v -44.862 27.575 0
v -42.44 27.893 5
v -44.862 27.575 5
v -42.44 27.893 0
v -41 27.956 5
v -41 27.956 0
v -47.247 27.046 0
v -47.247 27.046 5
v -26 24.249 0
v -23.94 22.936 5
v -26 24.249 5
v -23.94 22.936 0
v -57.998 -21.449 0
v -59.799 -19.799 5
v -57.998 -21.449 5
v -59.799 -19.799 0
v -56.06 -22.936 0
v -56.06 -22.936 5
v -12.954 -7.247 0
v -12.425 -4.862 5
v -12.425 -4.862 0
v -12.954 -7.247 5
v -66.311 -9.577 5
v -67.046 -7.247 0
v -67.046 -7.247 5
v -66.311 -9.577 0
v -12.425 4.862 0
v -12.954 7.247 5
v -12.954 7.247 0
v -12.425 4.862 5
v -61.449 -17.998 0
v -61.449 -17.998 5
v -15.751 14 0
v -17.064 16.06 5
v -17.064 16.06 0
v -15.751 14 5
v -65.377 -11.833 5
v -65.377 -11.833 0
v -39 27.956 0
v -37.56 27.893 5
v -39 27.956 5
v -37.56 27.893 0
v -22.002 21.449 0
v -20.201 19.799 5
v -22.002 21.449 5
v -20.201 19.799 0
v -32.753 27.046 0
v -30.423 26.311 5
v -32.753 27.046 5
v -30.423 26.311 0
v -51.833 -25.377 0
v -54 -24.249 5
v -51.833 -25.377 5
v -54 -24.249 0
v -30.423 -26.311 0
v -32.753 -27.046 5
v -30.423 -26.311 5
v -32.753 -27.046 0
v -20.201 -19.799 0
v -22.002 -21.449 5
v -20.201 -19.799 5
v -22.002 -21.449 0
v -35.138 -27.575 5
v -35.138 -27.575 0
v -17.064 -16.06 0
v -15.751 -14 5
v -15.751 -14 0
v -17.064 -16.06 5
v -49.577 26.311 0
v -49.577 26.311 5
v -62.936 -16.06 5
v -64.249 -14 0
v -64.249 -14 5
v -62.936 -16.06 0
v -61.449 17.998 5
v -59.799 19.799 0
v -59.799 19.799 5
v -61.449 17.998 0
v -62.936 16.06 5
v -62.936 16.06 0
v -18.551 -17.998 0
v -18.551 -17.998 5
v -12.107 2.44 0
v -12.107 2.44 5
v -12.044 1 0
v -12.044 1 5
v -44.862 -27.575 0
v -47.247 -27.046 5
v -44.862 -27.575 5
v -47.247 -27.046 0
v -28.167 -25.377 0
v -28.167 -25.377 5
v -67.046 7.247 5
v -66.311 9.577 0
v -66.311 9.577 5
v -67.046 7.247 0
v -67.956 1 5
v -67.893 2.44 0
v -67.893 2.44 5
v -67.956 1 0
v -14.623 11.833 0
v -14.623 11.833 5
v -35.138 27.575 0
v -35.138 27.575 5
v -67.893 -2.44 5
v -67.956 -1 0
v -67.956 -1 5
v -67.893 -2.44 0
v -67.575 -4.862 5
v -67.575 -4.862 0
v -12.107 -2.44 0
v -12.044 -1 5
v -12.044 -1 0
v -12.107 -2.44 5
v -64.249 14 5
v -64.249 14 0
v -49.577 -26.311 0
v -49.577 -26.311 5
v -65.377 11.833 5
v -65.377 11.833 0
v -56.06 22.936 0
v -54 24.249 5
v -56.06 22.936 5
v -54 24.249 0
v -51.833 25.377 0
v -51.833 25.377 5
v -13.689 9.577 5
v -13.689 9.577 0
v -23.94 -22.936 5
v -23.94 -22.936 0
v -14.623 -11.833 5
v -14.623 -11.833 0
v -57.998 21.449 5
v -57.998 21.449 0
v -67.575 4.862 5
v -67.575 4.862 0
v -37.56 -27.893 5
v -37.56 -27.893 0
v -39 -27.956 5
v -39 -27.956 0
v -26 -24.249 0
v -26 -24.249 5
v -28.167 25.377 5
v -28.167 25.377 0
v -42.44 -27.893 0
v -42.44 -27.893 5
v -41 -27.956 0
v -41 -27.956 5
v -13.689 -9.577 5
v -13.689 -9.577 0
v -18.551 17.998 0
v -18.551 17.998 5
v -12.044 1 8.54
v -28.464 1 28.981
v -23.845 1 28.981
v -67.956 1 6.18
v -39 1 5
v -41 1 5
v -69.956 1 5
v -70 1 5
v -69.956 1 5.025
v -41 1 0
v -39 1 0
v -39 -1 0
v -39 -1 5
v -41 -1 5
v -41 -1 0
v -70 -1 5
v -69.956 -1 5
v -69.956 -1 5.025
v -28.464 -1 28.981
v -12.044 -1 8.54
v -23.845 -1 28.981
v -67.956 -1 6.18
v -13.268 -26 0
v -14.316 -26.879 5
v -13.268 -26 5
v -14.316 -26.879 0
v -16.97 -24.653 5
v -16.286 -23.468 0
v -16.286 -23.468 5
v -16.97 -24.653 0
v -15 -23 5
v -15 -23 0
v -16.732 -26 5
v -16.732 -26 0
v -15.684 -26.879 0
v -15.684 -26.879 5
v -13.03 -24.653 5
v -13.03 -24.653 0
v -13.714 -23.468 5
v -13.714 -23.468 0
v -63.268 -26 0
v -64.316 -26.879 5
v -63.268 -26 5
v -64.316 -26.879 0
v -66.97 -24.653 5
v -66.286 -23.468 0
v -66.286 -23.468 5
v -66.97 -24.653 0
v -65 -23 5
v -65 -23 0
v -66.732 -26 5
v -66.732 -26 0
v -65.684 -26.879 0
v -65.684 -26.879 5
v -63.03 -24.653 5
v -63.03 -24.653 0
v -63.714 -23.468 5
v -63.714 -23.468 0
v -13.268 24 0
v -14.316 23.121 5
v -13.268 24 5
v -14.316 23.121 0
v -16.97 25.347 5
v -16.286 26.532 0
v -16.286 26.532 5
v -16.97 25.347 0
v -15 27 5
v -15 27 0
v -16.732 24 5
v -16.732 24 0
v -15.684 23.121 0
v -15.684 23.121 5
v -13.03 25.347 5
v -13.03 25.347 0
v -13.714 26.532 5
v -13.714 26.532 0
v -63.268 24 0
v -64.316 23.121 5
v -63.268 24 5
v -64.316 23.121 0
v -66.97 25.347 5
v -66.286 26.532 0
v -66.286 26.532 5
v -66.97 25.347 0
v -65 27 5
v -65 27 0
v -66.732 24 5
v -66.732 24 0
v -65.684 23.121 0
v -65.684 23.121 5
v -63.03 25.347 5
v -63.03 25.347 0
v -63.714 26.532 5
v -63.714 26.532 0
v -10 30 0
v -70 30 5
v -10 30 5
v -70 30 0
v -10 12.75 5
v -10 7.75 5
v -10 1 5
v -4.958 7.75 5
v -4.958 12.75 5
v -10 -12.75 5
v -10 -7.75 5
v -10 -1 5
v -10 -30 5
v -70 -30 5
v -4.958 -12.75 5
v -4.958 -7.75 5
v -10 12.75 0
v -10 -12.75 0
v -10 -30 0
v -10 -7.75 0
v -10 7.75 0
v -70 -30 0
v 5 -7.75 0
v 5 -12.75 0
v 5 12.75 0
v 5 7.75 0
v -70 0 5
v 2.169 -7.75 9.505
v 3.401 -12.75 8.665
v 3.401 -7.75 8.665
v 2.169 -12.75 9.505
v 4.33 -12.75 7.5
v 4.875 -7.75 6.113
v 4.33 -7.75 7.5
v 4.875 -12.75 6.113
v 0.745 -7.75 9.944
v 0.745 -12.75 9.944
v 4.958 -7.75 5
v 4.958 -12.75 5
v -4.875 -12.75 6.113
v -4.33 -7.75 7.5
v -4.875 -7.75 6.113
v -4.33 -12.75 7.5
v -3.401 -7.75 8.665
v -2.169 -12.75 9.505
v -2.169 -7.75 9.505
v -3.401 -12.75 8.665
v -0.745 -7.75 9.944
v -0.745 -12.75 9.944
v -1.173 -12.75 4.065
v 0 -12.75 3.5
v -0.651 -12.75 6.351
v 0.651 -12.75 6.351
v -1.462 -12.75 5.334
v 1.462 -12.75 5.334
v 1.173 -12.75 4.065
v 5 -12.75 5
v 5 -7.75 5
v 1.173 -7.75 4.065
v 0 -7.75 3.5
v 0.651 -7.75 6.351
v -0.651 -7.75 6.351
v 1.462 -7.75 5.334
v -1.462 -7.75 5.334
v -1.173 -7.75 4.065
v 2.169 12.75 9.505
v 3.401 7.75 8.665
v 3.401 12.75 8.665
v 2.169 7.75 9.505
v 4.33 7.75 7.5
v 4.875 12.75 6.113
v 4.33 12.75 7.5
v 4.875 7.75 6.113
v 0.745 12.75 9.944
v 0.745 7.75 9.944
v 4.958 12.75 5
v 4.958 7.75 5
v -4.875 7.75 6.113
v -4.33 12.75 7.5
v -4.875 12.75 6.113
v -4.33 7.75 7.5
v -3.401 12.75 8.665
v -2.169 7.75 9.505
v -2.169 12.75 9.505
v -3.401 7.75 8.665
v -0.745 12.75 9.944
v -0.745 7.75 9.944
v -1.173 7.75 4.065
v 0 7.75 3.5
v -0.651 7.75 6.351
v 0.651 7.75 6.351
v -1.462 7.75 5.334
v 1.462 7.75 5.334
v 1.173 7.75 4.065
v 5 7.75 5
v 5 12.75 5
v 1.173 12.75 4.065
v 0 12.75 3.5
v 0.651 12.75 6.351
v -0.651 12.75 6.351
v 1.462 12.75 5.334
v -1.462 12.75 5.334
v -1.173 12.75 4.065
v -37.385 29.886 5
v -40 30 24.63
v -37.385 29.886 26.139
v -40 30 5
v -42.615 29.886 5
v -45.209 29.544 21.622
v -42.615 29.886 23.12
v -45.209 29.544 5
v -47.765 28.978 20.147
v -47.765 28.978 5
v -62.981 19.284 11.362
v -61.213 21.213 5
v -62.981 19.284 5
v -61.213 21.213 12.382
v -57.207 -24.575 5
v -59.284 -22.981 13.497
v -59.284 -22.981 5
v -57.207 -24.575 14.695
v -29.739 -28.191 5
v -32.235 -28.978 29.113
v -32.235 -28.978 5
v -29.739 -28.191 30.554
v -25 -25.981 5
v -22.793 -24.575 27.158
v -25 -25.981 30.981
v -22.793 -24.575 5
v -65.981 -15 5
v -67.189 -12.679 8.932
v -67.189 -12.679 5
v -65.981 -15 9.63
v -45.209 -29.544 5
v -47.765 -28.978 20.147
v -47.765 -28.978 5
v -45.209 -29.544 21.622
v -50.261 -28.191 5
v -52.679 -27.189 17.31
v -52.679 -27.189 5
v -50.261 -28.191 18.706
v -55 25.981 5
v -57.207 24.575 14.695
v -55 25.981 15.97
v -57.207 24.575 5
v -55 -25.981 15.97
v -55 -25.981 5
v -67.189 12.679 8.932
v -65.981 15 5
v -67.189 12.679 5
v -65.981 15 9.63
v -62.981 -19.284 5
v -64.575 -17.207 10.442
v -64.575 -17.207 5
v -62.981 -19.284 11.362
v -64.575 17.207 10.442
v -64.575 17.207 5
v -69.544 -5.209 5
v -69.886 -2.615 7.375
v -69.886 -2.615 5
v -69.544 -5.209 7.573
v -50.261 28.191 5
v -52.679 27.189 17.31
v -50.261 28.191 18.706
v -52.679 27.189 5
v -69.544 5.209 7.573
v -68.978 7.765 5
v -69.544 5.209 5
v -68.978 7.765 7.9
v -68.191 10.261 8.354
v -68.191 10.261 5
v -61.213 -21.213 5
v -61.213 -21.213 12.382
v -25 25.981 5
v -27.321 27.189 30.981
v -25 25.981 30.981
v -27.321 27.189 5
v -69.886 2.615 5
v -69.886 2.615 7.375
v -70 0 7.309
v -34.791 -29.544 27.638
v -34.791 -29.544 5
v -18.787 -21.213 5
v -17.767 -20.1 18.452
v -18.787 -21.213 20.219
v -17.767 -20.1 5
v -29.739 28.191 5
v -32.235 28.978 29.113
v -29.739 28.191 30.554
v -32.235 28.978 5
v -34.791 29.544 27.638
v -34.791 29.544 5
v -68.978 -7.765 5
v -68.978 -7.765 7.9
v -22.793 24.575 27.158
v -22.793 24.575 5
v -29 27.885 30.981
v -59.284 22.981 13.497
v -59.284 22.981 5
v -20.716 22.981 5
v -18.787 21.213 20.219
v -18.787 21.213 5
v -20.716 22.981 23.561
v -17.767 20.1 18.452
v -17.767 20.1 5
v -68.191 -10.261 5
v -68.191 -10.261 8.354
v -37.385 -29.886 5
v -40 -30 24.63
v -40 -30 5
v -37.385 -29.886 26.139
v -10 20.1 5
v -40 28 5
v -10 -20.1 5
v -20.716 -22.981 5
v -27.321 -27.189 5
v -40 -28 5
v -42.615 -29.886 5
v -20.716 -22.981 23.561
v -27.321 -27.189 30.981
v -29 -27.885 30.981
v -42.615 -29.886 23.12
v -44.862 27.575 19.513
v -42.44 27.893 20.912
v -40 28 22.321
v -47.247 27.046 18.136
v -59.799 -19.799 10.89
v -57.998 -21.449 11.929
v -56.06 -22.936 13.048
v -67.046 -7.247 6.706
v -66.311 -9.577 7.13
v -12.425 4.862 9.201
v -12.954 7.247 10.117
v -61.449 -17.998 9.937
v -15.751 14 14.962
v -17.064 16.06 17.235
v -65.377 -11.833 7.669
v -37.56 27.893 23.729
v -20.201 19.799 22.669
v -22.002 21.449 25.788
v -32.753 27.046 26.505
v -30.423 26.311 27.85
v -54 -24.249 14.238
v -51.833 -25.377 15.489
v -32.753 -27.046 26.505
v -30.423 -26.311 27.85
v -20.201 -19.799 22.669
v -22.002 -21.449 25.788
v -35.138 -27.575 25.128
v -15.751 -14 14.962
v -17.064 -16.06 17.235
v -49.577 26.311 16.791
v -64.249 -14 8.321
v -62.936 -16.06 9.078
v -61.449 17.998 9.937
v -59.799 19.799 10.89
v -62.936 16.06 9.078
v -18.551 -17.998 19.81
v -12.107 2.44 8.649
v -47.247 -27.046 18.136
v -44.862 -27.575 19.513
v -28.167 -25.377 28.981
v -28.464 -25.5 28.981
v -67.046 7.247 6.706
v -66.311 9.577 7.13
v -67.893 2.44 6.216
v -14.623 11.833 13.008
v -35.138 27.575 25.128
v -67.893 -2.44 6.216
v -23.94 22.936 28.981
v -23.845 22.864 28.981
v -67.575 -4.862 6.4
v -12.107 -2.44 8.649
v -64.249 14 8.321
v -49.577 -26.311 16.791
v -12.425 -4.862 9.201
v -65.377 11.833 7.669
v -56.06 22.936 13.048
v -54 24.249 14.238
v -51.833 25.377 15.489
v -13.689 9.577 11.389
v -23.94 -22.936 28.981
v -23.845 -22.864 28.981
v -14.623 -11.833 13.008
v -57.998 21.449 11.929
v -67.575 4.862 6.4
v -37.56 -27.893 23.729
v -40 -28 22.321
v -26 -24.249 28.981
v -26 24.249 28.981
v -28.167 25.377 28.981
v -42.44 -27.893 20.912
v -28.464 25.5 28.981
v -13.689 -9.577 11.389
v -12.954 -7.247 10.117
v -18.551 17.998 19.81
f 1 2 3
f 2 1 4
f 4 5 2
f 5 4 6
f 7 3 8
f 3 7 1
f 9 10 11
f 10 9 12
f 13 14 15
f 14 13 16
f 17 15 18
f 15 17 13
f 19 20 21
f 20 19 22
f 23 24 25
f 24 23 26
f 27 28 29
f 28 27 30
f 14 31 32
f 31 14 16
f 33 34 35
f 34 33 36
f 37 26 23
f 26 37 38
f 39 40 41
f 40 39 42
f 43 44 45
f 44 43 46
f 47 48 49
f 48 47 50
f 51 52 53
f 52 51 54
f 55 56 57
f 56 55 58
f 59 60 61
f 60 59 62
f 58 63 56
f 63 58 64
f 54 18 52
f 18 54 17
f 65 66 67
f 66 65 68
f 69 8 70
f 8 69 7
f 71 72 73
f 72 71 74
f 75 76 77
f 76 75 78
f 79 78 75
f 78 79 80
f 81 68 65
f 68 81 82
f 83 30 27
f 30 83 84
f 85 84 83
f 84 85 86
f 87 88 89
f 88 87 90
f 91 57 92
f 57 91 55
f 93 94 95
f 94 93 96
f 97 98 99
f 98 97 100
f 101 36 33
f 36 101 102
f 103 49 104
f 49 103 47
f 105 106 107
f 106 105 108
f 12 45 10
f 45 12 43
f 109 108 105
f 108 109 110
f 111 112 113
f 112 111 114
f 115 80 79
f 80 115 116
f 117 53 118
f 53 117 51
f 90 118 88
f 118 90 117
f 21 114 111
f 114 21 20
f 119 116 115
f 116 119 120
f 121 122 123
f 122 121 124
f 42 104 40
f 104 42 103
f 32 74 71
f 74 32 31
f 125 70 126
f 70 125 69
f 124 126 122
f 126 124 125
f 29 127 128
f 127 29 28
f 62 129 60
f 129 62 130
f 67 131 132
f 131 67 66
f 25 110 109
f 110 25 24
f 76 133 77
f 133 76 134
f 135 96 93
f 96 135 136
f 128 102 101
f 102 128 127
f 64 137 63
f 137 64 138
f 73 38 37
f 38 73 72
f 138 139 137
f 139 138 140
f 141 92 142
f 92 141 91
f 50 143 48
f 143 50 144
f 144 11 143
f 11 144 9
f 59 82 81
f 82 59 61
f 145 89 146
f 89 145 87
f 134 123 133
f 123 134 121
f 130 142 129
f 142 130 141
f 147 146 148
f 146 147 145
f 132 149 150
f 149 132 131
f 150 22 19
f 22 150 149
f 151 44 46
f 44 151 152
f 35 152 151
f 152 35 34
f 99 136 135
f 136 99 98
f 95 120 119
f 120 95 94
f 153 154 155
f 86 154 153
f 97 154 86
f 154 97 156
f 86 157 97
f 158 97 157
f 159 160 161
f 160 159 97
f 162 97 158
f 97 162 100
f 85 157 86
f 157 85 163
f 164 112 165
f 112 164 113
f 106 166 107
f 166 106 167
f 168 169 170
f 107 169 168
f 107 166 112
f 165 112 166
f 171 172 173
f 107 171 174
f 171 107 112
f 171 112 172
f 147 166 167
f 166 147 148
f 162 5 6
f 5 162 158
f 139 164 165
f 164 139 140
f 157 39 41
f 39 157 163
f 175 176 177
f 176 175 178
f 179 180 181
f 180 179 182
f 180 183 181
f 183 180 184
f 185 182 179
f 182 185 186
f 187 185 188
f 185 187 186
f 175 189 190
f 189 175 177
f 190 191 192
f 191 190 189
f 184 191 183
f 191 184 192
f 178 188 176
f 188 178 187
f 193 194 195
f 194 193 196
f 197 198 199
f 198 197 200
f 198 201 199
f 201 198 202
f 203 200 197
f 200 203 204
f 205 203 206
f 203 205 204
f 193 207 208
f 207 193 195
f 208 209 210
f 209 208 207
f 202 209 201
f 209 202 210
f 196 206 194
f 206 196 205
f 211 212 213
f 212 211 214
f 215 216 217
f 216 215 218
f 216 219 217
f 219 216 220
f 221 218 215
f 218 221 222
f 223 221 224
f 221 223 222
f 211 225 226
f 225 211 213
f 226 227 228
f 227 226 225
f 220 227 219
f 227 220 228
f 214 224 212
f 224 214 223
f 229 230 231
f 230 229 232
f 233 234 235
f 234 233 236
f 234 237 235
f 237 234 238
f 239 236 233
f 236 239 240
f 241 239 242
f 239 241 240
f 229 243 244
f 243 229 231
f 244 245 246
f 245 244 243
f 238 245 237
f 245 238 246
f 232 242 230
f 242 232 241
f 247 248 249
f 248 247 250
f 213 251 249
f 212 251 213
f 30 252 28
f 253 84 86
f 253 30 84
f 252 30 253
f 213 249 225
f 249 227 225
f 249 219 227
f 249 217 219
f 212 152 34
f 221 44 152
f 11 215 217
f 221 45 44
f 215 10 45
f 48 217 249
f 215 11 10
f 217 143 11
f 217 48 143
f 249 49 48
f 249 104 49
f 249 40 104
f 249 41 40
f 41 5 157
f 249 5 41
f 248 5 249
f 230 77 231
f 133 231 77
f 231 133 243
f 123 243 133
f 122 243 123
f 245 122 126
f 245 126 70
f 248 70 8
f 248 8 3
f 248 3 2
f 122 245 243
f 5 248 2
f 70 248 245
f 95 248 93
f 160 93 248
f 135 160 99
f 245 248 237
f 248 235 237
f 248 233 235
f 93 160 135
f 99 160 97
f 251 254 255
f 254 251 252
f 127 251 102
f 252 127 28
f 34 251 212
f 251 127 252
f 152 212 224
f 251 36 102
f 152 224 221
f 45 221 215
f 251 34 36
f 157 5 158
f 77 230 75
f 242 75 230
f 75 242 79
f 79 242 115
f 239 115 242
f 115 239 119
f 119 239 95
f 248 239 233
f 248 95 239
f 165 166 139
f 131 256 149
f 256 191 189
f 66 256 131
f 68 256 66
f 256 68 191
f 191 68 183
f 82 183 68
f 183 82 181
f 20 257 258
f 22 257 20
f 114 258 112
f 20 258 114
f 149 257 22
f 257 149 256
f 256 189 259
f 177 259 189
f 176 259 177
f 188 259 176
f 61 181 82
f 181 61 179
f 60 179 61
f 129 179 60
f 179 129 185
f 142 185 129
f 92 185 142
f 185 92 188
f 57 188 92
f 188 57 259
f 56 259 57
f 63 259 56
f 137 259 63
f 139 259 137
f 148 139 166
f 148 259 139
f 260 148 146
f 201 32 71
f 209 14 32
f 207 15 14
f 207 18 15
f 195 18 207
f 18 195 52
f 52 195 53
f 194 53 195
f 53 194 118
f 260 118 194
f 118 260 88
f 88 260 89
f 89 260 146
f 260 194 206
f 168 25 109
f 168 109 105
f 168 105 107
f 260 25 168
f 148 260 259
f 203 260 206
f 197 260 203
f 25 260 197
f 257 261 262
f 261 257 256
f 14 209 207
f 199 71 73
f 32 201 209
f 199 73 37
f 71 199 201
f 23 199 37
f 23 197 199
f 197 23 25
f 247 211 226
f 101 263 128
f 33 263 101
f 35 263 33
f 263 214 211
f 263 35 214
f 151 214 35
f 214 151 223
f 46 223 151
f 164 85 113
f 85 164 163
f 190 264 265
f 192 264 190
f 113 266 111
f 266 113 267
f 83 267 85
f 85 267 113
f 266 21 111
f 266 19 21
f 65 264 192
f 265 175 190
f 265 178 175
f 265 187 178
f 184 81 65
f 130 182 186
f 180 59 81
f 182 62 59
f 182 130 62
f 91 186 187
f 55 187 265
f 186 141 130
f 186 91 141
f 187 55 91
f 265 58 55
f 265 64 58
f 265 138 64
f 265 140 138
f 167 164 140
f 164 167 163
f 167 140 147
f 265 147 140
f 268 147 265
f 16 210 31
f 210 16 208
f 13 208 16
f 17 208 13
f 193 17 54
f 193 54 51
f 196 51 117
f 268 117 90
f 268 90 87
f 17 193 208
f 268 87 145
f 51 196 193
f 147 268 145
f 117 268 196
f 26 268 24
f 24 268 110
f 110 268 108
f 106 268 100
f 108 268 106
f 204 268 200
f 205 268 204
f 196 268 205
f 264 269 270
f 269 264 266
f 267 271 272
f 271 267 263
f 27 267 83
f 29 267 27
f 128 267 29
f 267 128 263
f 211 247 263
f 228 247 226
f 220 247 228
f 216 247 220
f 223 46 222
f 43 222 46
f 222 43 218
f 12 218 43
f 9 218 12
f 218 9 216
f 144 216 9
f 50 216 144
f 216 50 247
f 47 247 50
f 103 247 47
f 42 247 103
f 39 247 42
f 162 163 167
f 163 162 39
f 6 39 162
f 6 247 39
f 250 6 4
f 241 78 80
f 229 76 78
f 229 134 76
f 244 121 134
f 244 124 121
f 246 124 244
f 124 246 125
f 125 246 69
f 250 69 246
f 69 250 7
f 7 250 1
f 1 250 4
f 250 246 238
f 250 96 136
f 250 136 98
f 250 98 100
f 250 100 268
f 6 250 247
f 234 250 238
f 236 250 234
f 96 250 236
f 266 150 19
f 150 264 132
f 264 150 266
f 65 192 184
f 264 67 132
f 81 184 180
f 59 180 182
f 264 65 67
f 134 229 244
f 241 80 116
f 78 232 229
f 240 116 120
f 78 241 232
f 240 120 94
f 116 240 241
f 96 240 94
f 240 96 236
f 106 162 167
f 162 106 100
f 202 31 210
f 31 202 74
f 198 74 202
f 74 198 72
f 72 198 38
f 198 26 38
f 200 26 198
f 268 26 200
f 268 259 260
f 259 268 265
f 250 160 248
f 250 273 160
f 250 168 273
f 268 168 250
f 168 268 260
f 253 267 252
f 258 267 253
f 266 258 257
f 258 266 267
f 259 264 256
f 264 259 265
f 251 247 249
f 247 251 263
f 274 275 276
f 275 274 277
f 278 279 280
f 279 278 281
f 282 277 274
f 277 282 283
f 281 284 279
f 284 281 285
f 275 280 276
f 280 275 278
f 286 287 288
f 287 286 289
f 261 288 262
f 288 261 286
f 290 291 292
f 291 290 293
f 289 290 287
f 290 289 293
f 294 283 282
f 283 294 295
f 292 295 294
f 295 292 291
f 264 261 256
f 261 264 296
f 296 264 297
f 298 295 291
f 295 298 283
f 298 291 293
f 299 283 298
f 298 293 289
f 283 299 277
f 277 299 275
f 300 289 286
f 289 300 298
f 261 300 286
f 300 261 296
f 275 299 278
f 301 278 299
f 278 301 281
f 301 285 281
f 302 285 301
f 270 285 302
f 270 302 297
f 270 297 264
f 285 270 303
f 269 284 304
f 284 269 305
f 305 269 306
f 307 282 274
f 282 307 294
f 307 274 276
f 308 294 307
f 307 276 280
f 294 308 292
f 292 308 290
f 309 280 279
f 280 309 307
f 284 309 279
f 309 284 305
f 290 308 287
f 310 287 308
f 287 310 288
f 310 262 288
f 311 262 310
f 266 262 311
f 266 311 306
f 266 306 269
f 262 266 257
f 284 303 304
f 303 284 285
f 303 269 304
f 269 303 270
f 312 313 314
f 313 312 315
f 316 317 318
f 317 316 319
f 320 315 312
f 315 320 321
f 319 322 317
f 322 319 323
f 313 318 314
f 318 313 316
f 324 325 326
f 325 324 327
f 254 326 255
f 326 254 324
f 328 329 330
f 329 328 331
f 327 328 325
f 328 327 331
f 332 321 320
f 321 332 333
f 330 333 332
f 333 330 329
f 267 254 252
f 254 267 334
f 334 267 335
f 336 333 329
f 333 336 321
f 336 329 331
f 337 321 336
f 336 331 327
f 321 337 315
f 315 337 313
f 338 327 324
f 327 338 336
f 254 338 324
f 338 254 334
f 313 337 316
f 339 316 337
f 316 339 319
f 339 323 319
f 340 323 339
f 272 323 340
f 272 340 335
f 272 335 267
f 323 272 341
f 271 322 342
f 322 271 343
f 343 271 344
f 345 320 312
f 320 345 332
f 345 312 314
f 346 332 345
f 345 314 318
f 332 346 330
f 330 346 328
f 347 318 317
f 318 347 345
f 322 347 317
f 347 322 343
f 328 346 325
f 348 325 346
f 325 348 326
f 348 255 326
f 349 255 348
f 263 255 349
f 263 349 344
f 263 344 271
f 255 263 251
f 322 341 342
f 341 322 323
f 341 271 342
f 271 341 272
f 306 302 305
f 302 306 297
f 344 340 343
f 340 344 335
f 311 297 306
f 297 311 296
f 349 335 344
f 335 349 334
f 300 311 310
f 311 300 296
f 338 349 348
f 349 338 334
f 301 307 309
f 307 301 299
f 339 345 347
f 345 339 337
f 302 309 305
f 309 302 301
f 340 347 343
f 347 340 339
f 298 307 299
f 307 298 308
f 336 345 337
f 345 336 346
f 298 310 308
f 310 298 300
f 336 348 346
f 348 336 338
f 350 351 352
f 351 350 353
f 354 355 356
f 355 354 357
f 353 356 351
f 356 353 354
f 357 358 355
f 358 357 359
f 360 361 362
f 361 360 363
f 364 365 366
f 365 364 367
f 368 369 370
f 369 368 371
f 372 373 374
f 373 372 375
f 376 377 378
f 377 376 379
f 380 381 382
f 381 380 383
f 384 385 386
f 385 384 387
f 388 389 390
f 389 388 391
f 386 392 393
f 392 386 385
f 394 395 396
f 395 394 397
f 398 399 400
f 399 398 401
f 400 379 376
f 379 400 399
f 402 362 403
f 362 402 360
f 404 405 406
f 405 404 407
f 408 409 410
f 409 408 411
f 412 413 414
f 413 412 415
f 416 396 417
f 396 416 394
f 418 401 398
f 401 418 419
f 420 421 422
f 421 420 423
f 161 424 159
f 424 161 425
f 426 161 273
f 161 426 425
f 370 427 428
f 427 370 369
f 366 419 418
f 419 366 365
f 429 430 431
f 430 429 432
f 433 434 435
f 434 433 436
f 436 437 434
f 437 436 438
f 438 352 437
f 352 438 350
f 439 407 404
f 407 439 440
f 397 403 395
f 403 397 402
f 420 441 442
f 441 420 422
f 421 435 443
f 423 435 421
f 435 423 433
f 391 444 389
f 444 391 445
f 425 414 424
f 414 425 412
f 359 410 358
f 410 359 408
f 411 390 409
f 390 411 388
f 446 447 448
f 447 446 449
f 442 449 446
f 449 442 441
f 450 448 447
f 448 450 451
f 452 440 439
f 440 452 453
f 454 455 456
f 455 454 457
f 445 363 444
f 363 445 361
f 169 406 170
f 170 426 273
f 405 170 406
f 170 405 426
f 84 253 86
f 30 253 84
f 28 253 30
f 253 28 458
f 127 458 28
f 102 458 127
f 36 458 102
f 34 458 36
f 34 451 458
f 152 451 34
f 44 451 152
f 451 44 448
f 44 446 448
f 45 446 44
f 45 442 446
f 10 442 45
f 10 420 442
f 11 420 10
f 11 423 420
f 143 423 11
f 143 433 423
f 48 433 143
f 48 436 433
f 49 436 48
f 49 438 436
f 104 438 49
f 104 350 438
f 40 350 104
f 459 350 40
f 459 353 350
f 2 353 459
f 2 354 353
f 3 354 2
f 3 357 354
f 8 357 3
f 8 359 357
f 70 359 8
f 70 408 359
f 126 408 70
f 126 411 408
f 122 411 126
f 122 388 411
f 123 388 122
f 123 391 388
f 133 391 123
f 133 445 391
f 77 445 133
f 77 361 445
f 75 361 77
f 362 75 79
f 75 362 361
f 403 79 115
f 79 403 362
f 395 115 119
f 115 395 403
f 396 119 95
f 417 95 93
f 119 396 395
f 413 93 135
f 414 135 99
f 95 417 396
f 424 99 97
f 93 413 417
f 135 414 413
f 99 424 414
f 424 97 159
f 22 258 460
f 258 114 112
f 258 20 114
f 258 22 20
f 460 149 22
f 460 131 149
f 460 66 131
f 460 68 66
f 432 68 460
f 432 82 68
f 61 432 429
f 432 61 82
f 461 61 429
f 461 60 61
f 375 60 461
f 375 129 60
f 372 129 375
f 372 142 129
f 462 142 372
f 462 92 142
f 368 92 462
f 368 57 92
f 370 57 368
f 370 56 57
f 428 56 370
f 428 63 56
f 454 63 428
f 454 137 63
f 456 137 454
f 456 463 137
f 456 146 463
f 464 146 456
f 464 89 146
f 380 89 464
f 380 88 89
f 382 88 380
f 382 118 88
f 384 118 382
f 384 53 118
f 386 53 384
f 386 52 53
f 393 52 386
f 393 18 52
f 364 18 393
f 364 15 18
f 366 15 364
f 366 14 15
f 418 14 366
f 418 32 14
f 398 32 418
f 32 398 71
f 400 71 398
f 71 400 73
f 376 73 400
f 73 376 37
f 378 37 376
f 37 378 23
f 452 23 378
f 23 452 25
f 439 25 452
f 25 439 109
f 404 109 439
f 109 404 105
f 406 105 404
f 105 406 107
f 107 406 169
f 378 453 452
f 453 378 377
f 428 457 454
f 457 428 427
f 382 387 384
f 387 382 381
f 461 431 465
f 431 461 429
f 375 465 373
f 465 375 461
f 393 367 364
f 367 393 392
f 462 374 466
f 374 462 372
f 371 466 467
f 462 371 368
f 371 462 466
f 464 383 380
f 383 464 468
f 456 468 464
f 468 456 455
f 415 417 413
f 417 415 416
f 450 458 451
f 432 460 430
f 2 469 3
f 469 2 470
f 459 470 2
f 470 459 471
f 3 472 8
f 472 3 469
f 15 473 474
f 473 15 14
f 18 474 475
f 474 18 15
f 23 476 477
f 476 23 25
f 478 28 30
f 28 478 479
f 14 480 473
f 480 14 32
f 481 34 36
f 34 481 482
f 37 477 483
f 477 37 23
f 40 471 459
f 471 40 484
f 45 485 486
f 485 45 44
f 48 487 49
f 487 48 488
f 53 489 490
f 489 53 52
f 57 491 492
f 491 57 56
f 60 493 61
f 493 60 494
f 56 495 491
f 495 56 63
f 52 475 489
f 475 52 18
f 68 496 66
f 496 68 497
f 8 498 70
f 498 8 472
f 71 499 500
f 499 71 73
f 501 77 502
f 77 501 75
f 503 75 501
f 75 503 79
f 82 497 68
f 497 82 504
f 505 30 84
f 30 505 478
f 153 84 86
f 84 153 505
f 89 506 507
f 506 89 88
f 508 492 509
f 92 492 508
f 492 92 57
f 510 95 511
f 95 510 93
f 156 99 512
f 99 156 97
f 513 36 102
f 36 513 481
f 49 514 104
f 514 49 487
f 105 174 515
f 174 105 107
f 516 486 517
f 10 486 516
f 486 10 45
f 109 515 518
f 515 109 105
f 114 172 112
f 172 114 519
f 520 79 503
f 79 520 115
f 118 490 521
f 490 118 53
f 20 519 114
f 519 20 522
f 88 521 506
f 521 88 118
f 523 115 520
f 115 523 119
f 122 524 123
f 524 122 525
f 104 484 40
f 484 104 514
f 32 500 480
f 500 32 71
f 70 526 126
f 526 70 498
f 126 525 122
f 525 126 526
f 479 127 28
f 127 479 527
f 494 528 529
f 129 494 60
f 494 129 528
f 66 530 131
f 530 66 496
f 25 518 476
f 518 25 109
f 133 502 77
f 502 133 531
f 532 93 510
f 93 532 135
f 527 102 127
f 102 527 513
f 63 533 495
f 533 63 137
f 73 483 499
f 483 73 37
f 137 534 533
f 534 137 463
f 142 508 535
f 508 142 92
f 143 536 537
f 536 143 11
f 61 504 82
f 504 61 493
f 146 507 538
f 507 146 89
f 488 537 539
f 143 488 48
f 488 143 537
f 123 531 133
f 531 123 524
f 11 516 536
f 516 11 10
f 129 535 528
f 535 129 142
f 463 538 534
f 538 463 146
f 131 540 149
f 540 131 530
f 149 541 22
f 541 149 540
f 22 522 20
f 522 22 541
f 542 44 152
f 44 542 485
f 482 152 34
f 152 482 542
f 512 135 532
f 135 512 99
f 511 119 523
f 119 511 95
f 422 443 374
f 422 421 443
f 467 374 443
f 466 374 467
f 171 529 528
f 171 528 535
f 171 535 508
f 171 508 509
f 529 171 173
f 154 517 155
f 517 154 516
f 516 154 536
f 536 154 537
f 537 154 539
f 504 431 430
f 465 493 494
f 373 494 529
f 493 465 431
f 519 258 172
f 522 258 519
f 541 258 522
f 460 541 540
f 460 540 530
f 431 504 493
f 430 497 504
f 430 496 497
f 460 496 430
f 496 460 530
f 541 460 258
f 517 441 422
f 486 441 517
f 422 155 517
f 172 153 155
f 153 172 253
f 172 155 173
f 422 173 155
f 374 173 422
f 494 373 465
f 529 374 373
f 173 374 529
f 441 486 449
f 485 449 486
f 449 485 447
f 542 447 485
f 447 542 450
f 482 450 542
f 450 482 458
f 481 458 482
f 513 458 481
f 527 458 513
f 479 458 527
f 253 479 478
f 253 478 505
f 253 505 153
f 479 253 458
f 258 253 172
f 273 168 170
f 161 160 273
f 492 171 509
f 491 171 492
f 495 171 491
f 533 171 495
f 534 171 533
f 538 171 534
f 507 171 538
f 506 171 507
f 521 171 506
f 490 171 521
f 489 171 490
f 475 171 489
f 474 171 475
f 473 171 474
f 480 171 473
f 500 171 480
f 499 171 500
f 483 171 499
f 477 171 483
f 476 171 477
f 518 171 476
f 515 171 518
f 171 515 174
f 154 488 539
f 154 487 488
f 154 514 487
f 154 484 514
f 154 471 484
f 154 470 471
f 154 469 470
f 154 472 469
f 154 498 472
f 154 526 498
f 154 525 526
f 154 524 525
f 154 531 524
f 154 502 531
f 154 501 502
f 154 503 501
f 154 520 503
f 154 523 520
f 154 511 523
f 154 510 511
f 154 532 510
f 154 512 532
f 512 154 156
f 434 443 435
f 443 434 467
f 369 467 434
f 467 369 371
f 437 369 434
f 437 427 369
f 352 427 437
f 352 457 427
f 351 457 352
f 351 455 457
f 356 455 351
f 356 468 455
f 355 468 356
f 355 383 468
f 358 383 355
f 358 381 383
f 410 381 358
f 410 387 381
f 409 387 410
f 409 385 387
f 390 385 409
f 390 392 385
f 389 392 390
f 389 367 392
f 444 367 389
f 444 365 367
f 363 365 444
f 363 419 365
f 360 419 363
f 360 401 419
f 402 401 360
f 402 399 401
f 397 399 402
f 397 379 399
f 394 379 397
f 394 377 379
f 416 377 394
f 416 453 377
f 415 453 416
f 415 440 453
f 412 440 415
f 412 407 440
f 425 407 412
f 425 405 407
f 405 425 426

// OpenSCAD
// file: config.scad
snappy_version = 0.91;


// 0 = Thinning Walls (Thin in the middle, thick at edges.  Prettier smooth walls.)
// 1 = Corrugated walls. (Zig-zagged walls. Less shrinkage stress. Closed walls.)
// 2 = Crossbeam walls. (Open sparse struts. Far less shrinkage stress. Recommended.)
wall_styling = 2;


platform_length = 100; // mm.  Must be a multiple of rack_tooth_size.
platform_width  = 150; // mm
platform_height =  40; // mm
platform_thick  =   7; // mm

rail_length   = 150;    // mm
rail_height   =  50;    // mm
rail_thick    =   7;    // mm
rail_offset   =  12;    // mm

motor_rail_length = 100; // mm
cantilever_length = 125; // mm

groove_angle  =  30;    // degrees
groove_height =  12;    // mm

joiner_angle  =  30;    // degrees
joiner_width  =  10;    // mm

rack_tooth_size  =  5; // mm per tooth.
set_screw_size   =  3; // mm size of set screw in drive gears, couplers, etc
motor_shaft_size =  5; // mm
motor_shaft_flatted = false;  // boolean. Set true if motor shaft has a flattened side.

// Currently configured for 3/8" ACME threaded rod and matching 11/16" nut
lifter_rod_diam    =   9.5; // mm
lifter_rod_length  = 300.0; // mm
lifter_nut_size    =  17.4; // mm
lifter_nut_thick   =   9.3; // mm
lifter_thread_size =   3.175; // mm lift per revolution

// Mechanical endstop boards.
endstop_hole_spacing = 19; // mm
endstop_hole_inset   =  4; // mm
endstop_hole_hoff    = 10; // mm
endstop_click_voff   =  4; // mm
endstop_screw_size   =  3; // mm
endstop_standoff     =  2; // mm

// Standard Mk2b Heated Build Platform from RepRapDiscount.com
hbp_width       = 215;   // mm
hbp_length      = 215;   // mm
hbp_hole_width  = 208.5; // mm
hbp_hole_length = 208.5; // mm
hbp_screwsize   =   3;   // mm

// Standard 200mm square borosilicate glass build platform
glass_width     = 214;   // mm
glass_length    = 200;   // mm
glass_thick     =   3;   // mm

// Fan shroud dimensions
fan_size         = 60;  // mm
fan_screw_size   =  4;  // mm
fan_mount_length = 15;  // mm
fan_mount_width  = 10;  // mm
fan_mount_screw  =  3;  // mm
fan_shroud_angle = 60;  // degrees

// This is the slop needed to make parts fit more exactly, and may be
// printer dependant.  Printing a slop calibration plate should help
// dial this setting in for your printer.
printer_slop =   0.25; // mm



// Commonly used derived values.  Don't change these.
rail_spacing = platform_width - joiner_width*4 - 10;
rail_width = rail_spacing + joiner_width*2;
motor_mount_spacing=43+joiner_width+10;

wall_styles = ["thinwall", "corrugated", "crossbeams"];
wall_style = wall_styles[wall_styling];


// vim: noexpandtab tabstop=4 shiftwidth=4 softtabstop=4 nowrap
// main file
include <config.scad>
use <GDMUtils.scad>


$fa=5;
$fs=1.5;


module fanHingeMount(h=6, h2=-1, screwsize=3, spacing=15.5, hingewidth=3, hingelength=12)
{
	h2 = (h2<0)? h : h2;
	translate([0,-h/2-(hingelength-h),h/2]) {
		difference() {
			union() {
				grid_of(count=2, spacing=hingelength+hingewidth+0.5) {
					rotate([0,90,0])
						cylinder(h=hingewidth, r=h/2, center=true);
					translate([0,hingelength/2-h/2,h2/2-h/2])
						cube(size=[hingewidth,hingelength,h2],center=true);
				}
			}
			rotate([0,90,0])
				cylinder(h=hingewidth*2+spacing+1, r=screwsize/2, center=true);
		}
	}
}



module fanMountPlate(size=40,diam=35,thickness=4,screwsize=3,mountscrew=3)
{
	union() {
		translate([0,0,thickness/2]) {
			difference() {
				cube(size = [size,size,thickness], center=true);
				difference() {
					cylinder(h=thickness+0.2, r=diam/2, center=true);
					cube(size=[2, diam, thickness+1], center=true);
					cube(size=[diam, 2, thickness+1], center=true);
				}
				grid_of(count=[2,2], spacing=size - 2*(screwsize+1)) {
					cylinder(h = thickness+0.1, r=screwsize/2, center=true);
				}
			}
		}
		translate([0,-size/2,0]) {
			fanHingeMount(
				h=screwsize*2.5,
				h2=thickness,
				spacing=fan_mount_length,
				screwsize=fan_mount_screw,
				hingewidth=5,
				hingelength=15
			);
		}
	}
}



module fanShroud(ang=45, r=20, wall=2)
{
	c = r*2*cos(ang);
	h = c*sin(ang);
	b = sqrt(c*c-h*h);
	offset=r-b;
	union() {
		difference() {
			union() {
				translate([0, 0, h/2]) {
					difference() {
						union() {
							cylinder(h=h, r=r, center=true);
							translate([0, -r/2, 0])
								cube(size=[2*r*0.67, r, h], center=true);
						}
						cylinder(h=h+1, r=r-wall, center=true);
					}
				}
				translate([0, 0, h/2])
					cube(size=[wall, 2*r, h], center=true);
				translate([0, 0, h-wall/2])
					cylinder(h=wall, r=r, center=true);
			}
			translate([0,-offset,h])
				rotate([ang,0,0])
					translate([-r,-2*r,0])
						cube(size=[r*2,r*4,r*2], center=false);
			translate([0,-offset,h])
				rotate([ang-90,0,0])
					translate([-r,-2*r,0])
						cube(size=[r*2,r*4,r*2], center=false);
		}
		intersection() {
			translate([0,-offset,h])
				rotate([ang-90,0,0])
					translate([-r,-2*r,0])
						cube(size=[r*2,r*4,wall], center=false);
			union() {
				cylinder(h=h, r=r, center=false);
				translate([0, -r/2, h/2])
					cube(size=[2*r*0.67, r, h], center=true);
			}
		}
	}
}


module fanAssembly(size=40, wall=3, plateh=3, screwsize=3, ang=45)
{
	union () {
		fanMountPlate(
			size=size,
			diam=size-2*wall,
			thickness=plateh,
			screwsize=screwsize
		);

		translate([0,0,plateh]) {
			fanShroud(r=size/2, wall=wall, ang=ang);
		}
	}
}



module extruder_fan_shroud()
{
	yrot(180) {
		translate([-(fan_size/2+15-5), 0, -5]) {
			zrot(90) {
				fanAssembly(
					size=fan_size,
					wall=2,
					plateh=5,
					screwsize=fan_screw_size,
					ang=fan_shroud_angle
				);
			}
		}
	}
}



module extruder_fan_shroud_parts() { // make me
	translate([0, 0, 5]) {
		yrot(180) {
			extruder_fan_shroud();
		}
	}
}

extruder_fan_shroud_parts();


// vim: noexpandtab tabstop=4 shiftwidth=4 softtabstop=4 nowrap
